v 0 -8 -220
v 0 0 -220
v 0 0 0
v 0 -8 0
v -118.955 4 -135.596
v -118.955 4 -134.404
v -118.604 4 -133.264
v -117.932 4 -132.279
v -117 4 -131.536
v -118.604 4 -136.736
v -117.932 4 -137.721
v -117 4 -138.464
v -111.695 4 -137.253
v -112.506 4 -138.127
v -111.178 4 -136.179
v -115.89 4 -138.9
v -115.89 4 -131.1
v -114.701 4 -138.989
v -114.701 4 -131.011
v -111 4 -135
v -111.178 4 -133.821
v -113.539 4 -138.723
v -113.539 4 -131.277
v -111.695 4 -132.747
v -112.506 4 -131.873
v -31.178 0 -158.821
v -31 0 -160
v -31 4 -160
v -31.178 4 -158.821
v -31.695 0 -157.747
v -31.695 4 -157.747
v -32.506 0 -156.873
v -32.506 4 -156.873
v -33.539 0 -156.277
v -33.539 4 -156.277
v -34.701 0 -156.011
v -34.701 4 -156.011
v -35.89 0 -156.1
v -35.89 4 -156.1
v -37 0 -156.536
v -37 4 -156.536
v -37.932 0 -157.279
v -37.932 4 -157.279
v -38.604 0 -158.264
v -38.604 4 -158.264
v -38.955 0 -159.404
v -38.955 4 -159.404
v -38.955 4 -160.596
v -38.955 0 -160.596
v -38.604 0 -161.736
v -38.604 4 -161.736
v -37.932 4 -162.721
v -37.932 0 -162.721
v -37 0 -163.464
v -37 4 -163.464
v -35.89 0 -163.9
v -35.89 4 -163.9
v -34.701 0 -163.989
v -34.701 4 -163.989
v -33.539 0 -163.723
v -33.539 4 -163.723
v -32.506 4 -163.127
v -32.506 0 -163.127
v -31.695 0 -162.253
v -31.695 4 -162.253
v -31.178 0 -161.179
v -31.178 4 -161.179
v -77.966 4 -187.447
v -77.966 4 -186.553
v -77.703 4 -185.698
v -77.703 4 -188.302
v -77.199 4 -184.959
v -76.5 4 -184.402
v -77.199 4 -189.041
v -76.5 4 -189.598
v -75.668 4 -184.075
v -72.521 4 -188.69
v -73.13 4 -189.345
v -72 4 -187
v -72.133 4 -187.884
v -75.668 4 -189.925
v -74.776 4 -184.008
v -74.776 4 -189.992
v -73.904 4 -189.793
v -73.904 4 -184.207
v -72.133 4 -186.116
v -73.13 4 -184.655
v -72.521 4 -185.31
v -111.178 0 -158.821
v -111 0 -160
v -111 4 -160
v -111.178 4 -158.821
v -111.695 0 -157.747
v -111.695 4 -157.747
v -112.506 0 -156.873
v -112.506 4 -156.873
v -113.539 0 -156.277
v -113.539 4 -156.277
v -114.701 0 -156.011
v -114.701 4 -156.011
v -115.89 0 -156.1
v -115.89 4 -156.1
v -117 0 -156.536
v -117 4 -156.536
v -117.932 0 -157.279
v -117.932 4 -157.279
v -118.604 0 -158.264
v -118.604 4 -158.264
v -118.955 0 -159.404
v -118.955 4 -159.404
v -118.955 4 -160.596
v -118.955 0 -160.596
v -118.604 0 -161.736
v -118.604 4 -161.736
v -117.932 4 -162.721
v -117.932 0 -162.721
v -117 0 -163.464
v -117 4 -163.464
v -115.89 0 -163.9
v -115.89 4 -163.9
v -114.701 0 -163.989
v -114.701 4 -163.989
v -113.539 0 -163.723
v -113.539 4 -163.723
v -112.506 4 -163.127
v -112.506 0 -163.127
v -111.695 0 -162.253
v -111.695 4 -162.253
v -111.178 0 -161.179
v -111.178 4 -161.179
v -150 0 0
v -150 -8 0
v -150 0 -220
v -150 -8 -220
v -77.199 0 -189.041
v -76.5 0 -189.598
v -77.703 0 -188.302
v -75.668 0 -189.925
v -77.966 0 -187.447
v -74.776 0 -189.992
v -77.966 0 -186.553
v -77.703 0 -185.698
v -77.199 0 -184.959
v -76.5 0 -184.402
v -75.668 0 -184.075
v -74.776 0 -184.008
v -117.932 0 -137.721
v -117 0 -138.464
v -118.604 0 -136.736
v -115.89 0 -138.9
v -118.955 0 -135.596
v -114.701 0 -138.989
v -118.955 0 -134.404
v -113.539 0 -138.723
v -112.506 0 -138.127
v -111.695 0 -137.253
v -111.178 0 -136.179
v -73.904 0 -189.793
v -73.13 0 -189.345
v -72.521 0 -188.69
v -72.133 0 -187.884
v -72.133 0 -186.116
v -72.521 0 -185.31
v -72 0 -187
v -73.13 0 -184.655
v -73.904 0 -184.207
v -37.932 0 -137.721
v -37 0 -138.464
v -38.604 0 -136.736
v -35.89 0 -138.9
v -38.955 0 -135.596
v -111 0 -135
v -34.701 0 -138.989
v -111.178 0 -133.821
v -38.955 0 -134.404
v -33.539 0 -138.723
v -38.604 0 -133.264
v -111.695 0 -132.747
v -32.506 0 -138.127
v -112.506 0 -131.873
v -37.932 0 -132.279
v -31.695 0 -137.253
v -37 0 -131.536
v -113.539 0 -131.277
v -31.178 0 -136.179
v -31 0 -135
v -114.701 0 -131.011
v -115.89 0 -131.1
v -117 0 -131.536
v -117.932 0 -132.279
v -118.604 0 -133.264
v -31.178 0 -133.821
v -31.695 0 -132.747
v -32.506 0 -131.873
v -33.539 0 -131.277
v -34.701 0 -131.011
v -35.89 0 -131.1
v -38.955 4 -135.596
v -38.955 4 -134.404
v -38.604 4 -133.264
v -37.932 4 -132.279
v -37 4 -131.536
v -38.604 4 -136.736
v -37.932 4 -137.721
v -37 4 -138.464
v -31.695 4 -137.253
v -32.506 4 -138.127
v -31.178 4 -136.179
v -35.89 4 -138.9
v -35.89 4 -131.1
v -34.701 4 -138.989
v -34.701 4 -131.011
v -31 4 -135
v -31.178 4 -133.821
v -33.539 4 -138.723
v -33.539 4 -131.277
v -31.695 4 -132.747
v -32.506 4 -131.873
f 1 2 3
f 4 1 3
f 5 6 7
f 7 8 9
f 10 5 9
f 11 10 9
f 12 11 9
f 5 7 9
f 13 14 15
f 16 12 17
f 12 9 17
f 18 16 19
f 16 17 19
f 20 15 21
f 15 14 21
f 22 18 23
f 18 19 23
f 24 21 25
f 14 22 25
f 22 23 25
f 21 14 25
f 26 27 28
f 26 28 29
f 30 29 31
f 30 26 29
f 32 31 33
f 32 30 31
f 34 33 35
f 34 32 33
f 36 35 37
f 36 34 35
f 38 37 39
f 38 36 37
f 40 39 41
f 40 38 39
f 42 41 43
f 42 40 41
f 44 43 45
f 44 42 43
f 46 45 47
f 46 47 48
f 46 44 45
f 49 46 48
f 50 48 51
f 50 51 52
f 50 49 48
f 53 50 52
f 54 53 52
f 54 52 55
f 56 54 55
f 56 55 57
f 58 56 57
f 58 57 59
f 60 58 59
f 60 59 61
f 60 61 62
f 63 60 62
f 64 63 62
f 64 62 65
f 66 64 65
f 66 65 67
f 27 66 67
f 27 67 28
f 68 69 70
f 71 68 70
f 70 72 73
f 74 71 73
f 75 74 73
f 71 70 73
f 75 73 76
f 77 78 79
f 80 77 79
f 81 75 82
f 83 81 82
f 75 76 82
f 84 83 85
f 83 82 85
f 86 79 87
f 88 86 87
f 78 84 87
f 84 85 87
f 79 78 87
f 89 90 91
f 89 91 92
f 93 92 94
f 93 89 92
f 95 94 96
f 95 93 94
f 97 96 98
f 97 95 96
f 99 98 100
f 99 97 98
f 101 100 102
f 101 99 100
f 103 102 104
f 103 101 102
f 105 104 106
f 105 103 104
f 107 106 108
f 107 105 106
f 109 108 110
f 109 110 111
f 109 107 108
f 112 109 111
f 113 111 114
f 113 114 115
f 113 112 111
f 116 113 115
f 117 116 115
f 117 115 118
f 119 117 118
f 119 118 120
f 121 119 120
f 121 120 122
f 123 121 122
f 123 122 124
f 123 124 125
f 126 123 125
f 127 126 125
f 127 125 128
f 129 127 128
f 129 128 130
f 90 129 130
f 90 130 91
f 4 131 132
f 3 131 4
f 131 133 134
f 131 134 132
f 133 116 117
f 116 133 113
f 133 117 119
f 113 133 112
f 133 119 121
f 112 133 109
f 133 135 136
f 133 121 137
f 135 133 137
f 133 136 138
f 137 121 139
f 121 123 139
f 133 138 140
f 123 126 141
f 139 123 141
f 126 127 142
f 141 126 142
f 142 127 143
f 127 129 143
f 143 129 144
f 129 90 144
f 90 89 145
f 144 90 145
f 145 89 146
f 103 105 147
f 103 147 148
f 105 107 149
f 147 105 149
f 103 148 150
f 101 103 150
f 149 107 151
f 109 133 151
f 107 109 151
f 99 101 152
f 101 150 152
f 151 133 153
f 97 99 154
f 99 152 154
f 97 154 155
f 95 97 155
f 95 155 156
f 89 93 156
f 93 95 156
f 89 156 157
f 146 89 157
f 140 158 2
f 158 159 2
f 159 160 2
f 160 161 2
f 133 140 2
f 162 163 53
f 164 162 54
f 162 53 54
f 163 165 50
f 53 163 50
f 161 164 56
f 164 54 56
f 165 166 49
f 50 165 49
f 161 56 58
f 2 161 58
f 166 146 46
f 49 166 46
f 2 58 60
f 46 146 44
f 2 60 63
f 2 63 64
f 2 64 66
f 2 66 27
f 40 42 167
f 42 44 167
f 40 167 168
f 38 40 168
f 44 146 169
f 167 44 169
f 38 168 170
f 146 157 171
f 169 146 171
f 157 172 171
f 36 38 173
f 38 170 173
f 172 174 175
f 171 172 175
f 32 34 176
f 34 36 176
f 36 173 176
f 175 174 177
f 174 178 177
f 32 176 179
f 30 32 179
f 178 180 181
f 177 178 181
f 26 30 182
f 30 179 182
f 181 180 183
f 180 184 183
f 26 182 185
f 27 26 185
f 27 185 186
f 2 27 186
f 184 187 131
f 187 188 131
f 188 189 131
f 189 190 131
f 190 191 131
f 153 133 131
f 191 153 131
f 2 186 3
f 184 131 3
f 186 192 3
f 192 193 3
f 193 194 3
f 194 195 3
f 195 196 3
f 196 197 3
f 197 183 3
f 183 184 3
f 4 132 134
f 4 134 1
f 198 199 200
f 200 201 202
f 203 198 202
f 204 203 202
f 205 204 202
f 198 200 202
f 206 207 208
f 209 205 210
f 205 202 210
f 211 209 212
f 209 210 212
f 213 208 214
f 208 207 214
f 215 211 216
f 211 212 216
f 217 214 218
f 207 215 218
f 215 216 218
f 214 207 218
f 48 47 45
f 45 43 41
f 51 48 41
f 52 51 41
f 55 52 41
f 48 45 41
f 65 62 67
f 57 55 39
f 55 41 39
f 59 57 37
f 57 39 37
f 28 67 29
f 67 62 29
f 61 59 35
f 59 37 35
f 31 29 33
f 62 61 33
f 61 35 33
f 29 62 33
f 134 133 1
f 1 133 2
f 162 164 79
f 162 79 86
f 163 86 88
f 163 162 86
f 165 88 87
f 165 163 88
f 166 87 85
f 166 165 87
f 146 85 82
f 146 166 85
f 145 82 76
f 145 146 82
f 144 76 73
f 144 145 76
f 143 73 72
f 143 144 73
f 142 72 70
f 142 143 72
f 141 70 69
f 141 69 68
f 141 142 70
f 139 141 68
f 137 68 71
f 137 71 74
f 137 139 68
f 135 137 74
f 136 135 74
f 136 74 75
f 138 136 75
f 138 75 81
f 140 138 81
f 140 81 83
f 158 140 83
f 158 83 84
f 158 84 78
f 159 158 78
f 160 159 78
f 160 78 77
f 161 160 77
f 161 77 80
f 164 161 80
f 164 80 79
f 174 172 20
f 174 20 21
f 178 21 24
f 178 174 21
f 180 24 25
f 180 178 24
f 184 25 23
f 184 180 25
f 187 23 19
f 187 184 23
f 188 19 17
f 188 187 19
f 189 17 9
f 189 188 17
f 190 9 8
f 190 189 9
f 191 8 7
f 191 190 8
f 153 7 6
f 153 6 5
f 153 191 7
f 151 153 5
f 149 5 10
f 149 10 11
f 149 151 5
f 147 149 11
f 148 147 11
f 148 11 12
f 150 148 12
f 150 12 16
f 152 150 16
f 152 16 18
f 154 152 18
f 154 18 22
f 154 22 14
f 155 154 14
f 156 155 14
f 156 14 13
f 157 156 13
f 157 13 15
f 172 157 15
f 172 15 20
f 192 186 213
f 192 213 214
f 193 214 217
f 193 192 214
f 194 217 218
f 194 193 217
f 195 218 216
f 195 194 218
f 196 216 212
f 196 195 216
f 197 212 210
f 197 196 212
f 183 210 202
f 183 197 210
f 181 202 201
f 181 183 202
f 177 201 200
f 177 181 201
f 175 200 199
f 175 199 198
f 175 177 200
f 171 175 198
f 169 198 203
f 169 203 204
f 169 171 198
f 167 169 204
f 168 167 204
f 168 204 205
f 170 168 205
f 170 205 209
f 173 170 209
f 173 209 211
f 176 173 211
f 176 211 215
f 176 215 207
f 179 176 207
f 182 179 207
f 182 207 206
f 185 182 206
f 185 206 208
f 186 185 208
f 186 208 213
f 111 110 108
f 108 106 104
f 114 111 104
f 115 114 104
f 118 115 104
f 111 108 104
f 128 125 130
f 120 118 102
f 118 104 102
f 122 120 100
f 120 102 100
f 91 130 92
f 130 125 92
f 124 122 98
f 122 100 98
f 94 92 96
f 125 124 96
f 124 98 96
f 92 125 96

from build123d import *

# Parameters (mm, degrees)
F0_W     = 150
F0_H     = 220
F1_DEPTH = 8
F2_R     = 3
F2_R_2   = 4
F3_DEPTH = 12


with BuildPart() as f1:
    # F0 (on Front) → F1 (new body)
    with BuildSketch(Plane.XZ):
        with Locations((-75, -110)):
            Rectangle(F0_W, F0_H)
    extrude(amount=F1_DEPTH)

    # F2 (on face) → F3 (join)
    with BuildSketch(Plane.XZ.offset(8)):
        with Locations((-75, -187)):
            Circle(F2_R)
        with Locations((-35, -135)):
            Circle(F2_R_2)
        with Locations((-35, -160)):
            Circle(F2_R_2)
        with Locations((-115, -135)):
            Circle(F2_R_2)
        with Locations((-115, -160)):
            Circle(F2_R_2)
    extrude(amount=-F3_DEPTH)


solid = f1.part
